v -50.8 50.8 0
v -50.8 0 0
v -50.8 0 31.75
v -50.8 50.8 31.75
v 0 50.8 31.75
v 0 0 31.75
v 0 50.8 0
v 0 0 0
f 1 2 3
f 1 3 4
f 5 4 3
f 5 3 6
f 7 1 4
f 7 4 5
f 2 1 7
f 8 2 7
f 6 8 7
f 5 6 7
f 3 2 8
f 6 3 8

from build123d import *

# Parameters (mm, degrees)
F0_W     = 50.8
F0_H     = 50.8
F1_DEPTH = 25.4
F2_DEPTH = 6.35
F3_DEPTH = 20.828


# Not quite as in the source:
# - a feature names something its author has since deleted; it is built from what else it names


with BuildPart() as f1:
    # F0 (on Top) → F1 (new body)
    with BuildSketch(Plane.XY):
        with Locations((-25.4, 25.4)):
            Rectangle(F0_W, F0_H)
    extrude(amount=F1_DEPTH)

    # F2 (add): a face of the model
    f2_faces = [f1.faces().sort_by_distance(p)[0] for p in [
        (-25.4, 25.4, 25.4),
    ]]
    extrude(f2_faces, amount=F2_DEPTH)

    # F0 (on Top) → F3 (join)
    with BuildSketch(Plane.XY):
        with Locations((-25.4, 25.4)):
            Rectangle(F0_W, F0_H)
    extrude(amount=F3_DEPTH)


solid = f1.part
